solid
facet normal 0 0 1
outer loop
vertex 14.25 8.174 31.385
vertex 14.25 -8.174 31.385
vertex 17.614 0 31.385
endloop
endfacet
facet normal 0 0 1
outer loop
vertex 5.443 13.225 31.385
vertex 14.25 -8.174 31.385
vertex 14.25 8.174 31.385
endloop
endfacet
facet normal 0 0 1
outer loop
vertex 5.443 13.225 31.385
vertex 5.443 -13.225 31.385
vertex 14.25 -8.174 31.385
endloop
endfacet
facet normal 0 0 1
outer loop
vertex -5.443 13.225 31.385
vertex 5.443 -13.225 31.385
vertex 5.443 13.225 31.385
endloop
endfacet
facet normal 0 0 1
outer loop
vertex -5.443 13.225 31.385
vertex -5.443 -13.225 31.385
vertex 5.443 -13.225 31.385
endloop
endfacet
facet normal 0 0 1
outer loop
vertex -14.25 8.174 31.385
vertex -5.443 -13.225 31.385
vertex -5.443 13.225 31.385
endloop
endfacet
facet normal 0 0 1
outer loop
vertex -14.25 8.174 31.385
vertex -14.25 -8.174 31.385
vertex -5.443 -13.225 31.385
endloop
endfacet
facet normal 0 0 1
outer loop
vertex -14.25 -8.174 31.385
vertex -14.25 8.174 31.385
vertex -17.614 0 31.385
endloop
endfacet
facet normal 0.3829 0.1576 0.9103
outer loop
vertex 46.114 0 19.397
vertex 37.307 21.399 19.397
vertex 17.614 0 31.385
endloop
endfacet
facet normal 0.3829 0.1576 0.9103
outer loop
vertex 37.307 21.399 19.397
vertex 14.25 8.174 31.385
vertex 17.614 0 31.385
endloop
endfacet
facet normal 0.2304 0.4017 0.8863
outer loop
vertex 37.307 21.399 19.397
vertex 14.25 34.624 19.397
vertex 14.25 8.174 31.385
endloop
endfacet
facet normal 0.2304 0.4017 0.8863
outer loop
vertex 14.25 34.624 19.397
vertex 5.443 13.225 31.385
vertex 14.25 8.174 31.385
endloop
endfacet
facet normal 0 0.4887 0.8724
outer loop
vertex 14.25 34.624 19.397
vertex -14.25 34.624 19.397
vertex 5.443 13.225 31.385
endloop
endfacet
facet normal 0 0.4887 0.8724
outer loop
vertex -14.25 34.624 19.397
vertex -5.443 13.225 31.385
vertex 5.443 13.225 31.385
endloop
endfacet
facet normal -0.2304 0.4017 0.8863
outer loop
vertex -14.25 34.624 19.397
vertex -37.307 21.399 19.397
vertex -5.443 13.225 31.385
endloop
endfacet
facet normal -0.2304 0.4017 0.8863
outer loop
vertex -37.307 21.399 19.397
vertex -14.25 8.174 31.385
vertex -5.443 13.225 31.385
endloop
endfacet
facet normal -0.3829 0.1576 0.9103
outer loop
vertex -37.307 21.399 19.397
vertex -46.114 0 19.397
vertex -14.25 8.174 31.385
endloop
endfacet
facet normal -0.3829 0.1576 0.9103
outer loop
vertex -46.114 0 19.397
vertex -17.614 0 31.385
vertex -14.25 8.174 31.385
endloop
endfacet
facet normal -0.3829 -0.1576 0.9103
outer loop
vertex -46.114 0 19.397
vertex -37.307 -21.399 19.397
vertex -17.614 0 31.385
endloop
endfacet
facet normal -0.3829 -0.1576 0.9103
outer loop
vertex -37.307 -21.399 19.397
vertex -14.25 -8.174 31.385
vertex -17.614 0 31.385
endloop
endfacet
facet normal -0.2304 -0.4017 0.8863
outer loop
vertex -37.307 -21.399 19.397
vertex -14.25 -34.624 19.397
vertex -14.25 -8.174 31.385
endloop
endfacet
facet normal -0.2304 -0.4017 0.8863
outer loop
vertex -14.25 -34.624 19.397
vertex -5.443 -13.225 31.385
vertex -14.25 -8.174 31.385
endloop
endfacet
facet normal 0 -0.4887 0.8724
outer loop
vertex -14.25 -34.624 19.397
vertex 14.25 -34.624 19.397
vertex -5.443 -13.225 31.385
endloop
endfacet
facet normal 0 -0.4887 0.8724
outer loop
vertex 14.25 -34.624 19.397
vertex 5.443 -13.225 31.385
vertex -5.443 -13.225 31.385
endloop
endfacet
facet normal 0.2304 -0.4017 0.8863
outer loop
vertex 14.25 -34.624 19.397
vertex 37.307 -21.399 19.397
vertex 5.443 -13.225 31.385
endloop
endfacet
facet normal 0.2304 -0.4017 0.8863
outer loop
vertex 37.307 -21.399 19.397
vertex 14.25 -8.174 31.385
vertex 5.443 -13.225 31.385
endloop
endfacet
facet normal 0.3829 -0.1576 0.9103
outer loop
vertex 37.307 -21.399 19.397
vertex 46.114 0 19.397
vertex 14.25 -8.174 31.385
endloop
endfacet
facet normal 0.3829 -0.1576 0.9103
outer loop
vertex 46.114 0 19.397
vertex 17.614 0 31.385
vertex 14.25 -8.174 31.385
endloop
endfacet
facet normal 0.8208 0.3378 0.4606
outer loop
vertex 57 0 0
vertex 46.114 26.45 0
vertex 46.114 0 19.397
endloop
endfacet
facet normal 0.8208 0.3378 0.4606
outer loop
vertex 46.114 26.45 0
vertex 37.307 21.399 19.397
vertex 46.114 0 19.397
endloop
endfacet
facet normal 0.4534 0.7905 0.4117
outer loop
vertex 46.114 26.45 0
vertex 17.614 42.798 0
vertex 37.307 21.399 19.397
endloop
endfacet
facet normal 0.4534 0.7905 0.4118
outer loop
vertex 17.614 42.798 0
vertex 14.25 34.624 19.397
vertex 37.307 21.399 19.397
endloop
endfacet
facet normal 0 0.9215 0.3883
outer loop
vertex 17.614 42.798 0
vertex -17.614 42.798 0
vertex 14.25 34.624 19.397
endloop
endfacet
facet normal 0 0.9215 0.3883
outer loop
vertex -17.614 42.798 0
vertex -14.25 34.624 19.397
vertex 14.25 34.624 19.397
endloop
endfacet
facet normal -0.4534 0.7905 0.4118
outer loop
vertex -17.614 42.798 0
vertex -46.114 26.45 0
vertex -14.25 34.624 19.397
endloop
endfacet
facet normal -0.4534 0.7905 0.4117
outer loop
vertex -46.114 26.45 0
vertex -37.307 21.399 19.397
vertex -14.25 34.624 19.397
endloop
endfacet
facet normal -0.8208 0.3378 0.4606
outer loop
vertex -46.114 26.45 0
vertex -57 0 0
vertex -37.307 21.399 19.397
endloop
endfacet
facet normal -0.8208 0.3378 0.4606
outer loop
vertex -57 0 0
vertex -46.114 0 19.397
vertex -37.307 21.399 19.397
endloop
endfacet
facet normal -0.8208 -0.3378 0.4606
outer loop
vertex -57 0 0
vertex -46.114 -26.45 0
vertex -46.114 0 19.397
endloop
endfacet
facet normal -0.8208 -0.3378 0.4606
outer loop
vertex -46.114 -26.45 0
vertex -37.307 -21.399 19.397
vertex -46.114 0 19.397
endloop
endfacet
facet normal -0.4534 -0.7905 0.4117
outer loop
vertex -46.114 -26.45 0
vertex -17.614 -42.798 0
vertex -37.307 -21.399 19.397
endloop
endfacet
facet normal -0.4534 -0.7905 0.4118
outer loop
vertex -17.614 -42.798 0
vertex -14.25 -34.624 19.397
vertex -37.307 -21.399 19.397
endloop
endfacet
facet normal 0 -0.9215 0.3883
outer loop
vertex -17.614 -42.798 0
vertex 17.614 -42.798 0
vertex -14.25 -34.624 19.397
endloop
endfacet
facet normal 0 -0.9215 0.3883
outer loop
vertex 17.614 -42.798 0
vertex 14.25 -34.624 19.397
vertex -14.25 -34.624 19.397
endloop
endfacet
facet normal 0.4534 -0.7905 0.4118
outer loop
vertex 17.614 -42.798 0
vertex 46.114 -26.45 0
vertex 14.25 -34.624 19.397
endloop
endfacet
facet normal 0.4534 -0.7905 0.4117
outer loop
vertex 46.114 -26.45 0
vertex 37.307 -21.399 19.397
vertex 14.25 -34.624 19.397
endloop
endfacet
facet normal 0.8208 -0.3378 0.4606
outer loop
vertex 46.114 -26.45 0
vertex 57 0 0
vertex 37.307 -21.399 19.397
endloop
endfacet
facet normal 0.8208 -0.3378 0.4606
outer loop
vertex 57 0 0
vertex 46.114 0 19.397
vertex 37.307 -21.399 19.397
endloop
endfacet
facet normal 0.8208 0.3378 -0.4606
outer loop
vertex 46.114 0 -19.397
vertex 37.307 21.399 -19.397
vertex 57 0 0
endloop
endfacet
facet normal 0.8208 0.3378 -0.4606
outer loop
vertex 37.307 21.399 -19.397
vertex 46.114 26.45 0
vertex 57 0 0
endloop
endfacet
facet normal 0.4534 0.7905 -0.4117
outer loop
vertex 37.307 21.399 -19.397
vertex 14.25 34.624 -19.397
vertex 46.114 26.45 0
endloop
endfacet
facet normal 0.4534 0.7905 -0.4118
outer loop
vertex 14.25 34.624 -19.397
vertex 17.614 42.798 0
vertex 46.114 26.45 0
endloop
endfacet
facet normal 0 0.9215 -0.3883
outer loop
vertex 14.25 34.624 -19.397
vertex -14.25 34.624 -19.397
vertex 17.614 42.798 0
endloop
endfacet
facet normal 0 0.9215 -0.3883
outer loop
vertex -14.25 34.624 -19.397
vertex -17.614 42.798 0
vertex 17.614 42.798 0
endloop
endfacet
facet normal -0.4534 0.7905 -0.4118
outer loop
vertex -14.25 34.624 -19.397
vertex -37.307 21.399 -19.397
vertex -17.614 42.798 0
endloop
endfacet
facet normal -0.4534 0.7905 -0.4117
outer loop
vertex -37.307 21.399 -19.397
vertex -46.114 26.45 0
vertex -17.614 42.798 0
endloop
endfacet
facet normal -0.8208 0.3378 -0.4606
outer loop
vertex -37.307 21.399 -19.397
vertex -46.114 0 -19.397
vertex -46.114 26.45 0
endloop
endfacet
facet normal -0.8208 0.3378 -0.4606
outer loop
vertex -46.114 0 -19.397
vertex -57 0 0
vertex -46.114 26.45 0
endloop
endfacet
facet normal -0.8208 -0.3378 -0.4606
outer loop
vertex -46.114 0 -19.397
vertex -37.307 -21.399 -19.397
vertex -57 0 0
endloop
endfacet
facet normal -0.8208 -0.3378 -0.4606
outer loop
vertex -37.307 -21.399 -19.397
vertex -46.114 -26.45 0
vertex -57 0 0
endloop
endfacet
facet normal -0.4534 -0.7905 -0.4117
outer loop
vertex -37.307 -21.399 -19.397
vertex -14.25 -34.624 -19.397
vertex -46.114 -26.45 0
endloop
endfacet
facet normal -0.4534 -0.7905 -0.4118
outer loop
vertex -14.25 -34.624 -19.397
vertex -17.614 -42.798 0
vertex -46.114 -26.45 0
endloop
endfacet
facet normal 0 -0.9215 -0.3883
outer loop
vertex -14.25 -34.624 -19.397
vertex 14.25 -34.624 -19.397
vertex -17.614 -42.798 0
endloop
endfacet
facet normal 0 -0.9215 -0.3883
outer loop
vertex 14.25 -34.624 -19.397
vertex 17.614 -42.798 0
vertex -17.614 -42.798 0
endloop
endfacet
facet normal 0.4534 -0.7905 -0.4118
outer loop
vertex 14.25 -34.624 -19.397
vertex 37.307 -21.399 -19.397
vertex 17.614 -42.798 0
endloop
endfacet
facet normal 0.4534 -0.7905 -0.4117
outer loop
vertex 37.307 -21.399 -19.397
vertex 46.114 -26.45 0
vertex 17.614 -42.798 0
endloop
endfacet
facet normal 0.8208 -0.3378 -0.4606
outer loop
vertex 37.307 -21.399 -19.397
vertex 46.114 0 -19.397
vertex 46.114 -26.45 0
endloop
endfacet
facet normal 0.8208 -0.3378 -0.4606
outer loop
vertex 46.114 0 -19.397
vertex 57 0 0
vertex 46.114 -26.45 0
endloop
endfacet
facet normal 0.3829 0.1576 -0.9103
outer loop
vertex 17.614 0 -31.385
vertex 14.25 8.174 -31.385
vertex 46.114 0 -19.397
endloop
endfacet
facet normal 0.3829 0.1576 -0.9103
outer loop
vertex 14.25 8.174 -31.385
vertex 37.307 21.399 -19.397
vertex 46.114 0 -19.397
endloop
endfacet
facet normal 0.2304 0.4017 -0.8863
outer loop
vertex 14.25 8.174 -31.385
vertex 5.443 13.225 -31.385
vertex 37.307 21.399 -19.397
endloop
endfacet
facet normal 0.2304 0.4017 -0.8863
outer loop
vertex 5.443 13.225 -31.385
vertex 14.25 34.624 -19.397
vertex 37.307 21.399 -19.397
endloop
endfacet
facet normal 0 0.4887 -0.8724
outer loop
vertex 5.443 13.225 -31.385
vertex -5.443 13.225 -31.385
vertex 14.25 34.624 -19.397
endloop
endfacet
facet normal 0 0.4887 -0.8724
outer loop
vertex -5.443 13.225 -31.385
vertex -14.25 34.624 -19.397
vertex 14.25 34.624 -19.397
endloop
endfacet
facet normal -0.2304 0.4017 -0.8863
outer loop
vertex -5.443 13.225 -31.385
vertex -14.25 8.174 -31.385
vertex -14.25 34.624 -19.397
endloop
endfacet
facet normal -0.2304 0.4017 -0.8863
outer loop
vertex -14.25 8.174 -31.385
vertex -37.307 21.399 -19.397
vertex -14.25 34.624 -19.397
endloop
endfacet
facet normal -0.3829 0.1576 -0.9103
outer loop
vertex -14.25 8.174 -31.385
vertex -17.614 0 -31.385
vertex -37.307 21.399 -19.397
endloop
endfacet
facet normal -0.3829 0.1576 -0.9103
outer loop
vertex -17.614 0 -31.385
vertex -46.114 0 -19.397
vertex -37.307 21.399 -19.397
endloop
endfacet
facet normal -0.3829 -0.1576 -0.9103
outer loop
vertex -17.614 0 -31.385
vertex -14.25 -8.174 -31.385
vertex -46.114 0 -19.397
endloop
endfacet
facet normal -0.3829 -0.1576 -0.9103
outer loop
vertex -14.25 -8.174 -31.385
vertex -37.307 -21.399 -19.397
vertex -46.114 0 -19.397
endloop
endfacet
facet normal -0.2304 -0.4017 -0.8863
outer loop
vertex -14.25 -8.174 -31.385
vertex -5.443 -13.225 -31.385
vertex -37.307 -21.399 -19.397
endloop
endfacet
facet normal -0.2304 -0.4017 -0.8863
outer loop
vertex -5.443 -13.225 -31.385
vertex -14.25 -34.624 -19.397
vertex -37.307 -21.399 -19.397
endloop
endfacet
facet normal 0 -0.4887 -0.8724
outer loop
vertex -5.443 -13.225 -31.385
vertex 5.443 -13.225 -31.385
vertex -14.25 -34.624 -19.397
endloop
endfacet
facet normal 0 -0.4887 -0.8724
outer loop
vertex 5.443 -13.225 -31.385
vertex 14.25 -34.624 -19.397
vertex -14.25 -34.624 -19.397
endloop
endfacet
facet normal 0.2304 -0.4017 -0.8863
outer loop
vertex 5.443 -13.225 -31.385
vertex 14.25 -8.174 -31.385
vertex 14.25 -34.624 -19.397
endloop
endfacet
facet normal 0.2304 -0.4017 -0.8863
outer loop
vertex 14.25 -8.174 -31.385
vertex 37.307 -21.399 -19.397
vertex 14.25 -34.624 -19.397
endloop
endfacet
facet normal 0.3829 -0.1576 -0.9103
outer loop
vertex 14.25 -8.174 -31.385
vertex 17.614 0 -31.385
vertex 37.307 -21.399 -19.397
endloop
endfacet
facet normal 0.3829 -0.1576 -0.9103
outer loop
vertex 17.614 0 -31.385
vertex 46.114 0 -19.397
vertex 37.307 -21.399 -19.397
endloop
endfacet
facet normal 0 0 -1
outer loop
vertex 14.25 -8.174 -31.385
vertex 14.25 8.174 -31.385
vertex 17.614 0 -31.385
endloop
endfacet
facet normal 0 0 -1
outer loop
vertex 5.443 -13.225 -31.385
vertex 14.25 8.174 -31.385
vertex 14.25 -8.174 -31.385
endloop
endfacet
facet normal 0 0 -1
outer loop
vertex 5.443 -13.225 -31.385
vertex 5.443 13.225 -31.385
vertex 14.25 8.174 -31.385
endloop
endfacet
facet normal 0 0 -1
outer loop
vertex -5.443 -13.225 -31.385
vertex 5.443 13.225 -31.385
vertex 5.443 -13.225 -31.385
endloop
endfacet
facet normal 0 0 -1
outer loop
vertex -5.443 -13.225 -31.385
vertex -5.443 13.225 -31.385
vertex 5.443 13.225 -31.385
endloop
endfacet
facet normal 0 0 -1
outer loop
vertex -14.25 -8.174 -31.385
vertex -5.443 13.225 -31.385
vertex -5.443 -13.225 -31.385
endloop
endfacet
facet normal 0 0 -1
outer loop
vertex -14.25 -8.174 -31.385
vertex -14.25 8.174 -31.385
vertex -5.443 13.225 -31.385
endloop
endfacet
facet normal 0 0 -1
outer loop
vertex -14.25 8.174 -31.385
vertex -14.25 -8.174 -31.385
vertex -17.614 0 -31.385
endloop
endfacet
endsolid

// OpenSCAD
// Generated by SolidPython 1.0.1 on 2020-07-29 00:46:54


scale(v = [19, 15, 11]) {
	sphere(r = 3);
}
/***********************************************
*********      SolidPython code:      **********
************************************************
 
# import packages: SolidPython
from solid import *
from solid.utils import *
from itertools import chain, combinations, permutations


class Resize:

    def __init__(self, scad_file):
        self.scad_file = scad_file
        #self.scad_file = import_scad(scad_file)
        # cone/cylinder param:
        self.r1 = 0
        self.r2 = 0
        self.h = 0
        # rectangular prism param:
        self.w = 0
        self.l = 0
        # ellipse param:
        self.r = 0

    # import OpenScad code (file name corresponds to shape)


    # classify shape + parameters
    def assign(self, param1, param2, param3):
        if self.scad_file == 'cone.scad':
            self.r1 = param1
            self.r2 = param2
            self.h = param3
        elif self.scad_file == 'cylinder.scad':
            self.r1 = param1
            self.r2 = param2
            self.h = param3
        elif self.scad_file == 'rectangularPrism.scad':
            self.h = param1
            self.l = param2
            self.w = param3
        else:
            self.r = param1
            self.h = param2

    # resize parameters
    def iterate(self):
        x = range(3, 20, 2)
        i = 1
        if self.scad_file == 'cone.scad':
            tempList = list(permutations(x, 2))
            for temp in tempList:
                param1 = temp[0]
                param2 = temp[1]
                filepath = 'produced_scad_files/' + 'cone' + str(param1) + '_' + str(param2) + '_' + '.scad'
                scad_render_to_file(cylinder(h=param1, r1=param2, r2=0), filepath)

        elif self.scad_file == 'cylinder.scad':
            tempList = list(permutations(x, 3))
            for temp in tempList:
                param1 = temp[0]
                param2 = temp[1]
                filepath = 'produced_scad_files/' + 'cylinder' + str(param1) + '_' + str(param2) + '_' + '.scad'
                scad_render_to_file(cylinder(h=param1, r1=param2, r2=param2), filepath)

        elif self.scad_file == 'rectangularPrism.scad':
            tempList = list(permutations(x, 3))
            for temp in tempList:
                param1 = temp[0]
                param2 = temp[1]
                param3 = temp[2]
                filepath = 'produced_scad_files/' + 'rectangularPrism' + str(param1) + '_' + str(param2) + '_' + str(
                    param3) + '.scad'
                scad_render_to_file(cube(size=(param1, param2, param3)), filepath)

        elif self.scad_file == 'ellipse.scad':
            tempList = list(permutations(x, 4))
            for temp in tempList:
                param1 = temp[0]
                param2 = temp[1]
                param3 = temp[2]
                param4 = temp[3]
                filepath = 'produced_scad_files/' + 'ellipse' + str(param1) + '_' + str(param2) + '_' + str(param3) + '_' + str(param4) + '.scad'
                scad_render_to_file(scale([param1, param2, param3])(sphere(r=param4)), filepath)

    def render_to_scadfile(self):
        scad_render_to_file(scad, 'example.scad') 
 
************************************************/
